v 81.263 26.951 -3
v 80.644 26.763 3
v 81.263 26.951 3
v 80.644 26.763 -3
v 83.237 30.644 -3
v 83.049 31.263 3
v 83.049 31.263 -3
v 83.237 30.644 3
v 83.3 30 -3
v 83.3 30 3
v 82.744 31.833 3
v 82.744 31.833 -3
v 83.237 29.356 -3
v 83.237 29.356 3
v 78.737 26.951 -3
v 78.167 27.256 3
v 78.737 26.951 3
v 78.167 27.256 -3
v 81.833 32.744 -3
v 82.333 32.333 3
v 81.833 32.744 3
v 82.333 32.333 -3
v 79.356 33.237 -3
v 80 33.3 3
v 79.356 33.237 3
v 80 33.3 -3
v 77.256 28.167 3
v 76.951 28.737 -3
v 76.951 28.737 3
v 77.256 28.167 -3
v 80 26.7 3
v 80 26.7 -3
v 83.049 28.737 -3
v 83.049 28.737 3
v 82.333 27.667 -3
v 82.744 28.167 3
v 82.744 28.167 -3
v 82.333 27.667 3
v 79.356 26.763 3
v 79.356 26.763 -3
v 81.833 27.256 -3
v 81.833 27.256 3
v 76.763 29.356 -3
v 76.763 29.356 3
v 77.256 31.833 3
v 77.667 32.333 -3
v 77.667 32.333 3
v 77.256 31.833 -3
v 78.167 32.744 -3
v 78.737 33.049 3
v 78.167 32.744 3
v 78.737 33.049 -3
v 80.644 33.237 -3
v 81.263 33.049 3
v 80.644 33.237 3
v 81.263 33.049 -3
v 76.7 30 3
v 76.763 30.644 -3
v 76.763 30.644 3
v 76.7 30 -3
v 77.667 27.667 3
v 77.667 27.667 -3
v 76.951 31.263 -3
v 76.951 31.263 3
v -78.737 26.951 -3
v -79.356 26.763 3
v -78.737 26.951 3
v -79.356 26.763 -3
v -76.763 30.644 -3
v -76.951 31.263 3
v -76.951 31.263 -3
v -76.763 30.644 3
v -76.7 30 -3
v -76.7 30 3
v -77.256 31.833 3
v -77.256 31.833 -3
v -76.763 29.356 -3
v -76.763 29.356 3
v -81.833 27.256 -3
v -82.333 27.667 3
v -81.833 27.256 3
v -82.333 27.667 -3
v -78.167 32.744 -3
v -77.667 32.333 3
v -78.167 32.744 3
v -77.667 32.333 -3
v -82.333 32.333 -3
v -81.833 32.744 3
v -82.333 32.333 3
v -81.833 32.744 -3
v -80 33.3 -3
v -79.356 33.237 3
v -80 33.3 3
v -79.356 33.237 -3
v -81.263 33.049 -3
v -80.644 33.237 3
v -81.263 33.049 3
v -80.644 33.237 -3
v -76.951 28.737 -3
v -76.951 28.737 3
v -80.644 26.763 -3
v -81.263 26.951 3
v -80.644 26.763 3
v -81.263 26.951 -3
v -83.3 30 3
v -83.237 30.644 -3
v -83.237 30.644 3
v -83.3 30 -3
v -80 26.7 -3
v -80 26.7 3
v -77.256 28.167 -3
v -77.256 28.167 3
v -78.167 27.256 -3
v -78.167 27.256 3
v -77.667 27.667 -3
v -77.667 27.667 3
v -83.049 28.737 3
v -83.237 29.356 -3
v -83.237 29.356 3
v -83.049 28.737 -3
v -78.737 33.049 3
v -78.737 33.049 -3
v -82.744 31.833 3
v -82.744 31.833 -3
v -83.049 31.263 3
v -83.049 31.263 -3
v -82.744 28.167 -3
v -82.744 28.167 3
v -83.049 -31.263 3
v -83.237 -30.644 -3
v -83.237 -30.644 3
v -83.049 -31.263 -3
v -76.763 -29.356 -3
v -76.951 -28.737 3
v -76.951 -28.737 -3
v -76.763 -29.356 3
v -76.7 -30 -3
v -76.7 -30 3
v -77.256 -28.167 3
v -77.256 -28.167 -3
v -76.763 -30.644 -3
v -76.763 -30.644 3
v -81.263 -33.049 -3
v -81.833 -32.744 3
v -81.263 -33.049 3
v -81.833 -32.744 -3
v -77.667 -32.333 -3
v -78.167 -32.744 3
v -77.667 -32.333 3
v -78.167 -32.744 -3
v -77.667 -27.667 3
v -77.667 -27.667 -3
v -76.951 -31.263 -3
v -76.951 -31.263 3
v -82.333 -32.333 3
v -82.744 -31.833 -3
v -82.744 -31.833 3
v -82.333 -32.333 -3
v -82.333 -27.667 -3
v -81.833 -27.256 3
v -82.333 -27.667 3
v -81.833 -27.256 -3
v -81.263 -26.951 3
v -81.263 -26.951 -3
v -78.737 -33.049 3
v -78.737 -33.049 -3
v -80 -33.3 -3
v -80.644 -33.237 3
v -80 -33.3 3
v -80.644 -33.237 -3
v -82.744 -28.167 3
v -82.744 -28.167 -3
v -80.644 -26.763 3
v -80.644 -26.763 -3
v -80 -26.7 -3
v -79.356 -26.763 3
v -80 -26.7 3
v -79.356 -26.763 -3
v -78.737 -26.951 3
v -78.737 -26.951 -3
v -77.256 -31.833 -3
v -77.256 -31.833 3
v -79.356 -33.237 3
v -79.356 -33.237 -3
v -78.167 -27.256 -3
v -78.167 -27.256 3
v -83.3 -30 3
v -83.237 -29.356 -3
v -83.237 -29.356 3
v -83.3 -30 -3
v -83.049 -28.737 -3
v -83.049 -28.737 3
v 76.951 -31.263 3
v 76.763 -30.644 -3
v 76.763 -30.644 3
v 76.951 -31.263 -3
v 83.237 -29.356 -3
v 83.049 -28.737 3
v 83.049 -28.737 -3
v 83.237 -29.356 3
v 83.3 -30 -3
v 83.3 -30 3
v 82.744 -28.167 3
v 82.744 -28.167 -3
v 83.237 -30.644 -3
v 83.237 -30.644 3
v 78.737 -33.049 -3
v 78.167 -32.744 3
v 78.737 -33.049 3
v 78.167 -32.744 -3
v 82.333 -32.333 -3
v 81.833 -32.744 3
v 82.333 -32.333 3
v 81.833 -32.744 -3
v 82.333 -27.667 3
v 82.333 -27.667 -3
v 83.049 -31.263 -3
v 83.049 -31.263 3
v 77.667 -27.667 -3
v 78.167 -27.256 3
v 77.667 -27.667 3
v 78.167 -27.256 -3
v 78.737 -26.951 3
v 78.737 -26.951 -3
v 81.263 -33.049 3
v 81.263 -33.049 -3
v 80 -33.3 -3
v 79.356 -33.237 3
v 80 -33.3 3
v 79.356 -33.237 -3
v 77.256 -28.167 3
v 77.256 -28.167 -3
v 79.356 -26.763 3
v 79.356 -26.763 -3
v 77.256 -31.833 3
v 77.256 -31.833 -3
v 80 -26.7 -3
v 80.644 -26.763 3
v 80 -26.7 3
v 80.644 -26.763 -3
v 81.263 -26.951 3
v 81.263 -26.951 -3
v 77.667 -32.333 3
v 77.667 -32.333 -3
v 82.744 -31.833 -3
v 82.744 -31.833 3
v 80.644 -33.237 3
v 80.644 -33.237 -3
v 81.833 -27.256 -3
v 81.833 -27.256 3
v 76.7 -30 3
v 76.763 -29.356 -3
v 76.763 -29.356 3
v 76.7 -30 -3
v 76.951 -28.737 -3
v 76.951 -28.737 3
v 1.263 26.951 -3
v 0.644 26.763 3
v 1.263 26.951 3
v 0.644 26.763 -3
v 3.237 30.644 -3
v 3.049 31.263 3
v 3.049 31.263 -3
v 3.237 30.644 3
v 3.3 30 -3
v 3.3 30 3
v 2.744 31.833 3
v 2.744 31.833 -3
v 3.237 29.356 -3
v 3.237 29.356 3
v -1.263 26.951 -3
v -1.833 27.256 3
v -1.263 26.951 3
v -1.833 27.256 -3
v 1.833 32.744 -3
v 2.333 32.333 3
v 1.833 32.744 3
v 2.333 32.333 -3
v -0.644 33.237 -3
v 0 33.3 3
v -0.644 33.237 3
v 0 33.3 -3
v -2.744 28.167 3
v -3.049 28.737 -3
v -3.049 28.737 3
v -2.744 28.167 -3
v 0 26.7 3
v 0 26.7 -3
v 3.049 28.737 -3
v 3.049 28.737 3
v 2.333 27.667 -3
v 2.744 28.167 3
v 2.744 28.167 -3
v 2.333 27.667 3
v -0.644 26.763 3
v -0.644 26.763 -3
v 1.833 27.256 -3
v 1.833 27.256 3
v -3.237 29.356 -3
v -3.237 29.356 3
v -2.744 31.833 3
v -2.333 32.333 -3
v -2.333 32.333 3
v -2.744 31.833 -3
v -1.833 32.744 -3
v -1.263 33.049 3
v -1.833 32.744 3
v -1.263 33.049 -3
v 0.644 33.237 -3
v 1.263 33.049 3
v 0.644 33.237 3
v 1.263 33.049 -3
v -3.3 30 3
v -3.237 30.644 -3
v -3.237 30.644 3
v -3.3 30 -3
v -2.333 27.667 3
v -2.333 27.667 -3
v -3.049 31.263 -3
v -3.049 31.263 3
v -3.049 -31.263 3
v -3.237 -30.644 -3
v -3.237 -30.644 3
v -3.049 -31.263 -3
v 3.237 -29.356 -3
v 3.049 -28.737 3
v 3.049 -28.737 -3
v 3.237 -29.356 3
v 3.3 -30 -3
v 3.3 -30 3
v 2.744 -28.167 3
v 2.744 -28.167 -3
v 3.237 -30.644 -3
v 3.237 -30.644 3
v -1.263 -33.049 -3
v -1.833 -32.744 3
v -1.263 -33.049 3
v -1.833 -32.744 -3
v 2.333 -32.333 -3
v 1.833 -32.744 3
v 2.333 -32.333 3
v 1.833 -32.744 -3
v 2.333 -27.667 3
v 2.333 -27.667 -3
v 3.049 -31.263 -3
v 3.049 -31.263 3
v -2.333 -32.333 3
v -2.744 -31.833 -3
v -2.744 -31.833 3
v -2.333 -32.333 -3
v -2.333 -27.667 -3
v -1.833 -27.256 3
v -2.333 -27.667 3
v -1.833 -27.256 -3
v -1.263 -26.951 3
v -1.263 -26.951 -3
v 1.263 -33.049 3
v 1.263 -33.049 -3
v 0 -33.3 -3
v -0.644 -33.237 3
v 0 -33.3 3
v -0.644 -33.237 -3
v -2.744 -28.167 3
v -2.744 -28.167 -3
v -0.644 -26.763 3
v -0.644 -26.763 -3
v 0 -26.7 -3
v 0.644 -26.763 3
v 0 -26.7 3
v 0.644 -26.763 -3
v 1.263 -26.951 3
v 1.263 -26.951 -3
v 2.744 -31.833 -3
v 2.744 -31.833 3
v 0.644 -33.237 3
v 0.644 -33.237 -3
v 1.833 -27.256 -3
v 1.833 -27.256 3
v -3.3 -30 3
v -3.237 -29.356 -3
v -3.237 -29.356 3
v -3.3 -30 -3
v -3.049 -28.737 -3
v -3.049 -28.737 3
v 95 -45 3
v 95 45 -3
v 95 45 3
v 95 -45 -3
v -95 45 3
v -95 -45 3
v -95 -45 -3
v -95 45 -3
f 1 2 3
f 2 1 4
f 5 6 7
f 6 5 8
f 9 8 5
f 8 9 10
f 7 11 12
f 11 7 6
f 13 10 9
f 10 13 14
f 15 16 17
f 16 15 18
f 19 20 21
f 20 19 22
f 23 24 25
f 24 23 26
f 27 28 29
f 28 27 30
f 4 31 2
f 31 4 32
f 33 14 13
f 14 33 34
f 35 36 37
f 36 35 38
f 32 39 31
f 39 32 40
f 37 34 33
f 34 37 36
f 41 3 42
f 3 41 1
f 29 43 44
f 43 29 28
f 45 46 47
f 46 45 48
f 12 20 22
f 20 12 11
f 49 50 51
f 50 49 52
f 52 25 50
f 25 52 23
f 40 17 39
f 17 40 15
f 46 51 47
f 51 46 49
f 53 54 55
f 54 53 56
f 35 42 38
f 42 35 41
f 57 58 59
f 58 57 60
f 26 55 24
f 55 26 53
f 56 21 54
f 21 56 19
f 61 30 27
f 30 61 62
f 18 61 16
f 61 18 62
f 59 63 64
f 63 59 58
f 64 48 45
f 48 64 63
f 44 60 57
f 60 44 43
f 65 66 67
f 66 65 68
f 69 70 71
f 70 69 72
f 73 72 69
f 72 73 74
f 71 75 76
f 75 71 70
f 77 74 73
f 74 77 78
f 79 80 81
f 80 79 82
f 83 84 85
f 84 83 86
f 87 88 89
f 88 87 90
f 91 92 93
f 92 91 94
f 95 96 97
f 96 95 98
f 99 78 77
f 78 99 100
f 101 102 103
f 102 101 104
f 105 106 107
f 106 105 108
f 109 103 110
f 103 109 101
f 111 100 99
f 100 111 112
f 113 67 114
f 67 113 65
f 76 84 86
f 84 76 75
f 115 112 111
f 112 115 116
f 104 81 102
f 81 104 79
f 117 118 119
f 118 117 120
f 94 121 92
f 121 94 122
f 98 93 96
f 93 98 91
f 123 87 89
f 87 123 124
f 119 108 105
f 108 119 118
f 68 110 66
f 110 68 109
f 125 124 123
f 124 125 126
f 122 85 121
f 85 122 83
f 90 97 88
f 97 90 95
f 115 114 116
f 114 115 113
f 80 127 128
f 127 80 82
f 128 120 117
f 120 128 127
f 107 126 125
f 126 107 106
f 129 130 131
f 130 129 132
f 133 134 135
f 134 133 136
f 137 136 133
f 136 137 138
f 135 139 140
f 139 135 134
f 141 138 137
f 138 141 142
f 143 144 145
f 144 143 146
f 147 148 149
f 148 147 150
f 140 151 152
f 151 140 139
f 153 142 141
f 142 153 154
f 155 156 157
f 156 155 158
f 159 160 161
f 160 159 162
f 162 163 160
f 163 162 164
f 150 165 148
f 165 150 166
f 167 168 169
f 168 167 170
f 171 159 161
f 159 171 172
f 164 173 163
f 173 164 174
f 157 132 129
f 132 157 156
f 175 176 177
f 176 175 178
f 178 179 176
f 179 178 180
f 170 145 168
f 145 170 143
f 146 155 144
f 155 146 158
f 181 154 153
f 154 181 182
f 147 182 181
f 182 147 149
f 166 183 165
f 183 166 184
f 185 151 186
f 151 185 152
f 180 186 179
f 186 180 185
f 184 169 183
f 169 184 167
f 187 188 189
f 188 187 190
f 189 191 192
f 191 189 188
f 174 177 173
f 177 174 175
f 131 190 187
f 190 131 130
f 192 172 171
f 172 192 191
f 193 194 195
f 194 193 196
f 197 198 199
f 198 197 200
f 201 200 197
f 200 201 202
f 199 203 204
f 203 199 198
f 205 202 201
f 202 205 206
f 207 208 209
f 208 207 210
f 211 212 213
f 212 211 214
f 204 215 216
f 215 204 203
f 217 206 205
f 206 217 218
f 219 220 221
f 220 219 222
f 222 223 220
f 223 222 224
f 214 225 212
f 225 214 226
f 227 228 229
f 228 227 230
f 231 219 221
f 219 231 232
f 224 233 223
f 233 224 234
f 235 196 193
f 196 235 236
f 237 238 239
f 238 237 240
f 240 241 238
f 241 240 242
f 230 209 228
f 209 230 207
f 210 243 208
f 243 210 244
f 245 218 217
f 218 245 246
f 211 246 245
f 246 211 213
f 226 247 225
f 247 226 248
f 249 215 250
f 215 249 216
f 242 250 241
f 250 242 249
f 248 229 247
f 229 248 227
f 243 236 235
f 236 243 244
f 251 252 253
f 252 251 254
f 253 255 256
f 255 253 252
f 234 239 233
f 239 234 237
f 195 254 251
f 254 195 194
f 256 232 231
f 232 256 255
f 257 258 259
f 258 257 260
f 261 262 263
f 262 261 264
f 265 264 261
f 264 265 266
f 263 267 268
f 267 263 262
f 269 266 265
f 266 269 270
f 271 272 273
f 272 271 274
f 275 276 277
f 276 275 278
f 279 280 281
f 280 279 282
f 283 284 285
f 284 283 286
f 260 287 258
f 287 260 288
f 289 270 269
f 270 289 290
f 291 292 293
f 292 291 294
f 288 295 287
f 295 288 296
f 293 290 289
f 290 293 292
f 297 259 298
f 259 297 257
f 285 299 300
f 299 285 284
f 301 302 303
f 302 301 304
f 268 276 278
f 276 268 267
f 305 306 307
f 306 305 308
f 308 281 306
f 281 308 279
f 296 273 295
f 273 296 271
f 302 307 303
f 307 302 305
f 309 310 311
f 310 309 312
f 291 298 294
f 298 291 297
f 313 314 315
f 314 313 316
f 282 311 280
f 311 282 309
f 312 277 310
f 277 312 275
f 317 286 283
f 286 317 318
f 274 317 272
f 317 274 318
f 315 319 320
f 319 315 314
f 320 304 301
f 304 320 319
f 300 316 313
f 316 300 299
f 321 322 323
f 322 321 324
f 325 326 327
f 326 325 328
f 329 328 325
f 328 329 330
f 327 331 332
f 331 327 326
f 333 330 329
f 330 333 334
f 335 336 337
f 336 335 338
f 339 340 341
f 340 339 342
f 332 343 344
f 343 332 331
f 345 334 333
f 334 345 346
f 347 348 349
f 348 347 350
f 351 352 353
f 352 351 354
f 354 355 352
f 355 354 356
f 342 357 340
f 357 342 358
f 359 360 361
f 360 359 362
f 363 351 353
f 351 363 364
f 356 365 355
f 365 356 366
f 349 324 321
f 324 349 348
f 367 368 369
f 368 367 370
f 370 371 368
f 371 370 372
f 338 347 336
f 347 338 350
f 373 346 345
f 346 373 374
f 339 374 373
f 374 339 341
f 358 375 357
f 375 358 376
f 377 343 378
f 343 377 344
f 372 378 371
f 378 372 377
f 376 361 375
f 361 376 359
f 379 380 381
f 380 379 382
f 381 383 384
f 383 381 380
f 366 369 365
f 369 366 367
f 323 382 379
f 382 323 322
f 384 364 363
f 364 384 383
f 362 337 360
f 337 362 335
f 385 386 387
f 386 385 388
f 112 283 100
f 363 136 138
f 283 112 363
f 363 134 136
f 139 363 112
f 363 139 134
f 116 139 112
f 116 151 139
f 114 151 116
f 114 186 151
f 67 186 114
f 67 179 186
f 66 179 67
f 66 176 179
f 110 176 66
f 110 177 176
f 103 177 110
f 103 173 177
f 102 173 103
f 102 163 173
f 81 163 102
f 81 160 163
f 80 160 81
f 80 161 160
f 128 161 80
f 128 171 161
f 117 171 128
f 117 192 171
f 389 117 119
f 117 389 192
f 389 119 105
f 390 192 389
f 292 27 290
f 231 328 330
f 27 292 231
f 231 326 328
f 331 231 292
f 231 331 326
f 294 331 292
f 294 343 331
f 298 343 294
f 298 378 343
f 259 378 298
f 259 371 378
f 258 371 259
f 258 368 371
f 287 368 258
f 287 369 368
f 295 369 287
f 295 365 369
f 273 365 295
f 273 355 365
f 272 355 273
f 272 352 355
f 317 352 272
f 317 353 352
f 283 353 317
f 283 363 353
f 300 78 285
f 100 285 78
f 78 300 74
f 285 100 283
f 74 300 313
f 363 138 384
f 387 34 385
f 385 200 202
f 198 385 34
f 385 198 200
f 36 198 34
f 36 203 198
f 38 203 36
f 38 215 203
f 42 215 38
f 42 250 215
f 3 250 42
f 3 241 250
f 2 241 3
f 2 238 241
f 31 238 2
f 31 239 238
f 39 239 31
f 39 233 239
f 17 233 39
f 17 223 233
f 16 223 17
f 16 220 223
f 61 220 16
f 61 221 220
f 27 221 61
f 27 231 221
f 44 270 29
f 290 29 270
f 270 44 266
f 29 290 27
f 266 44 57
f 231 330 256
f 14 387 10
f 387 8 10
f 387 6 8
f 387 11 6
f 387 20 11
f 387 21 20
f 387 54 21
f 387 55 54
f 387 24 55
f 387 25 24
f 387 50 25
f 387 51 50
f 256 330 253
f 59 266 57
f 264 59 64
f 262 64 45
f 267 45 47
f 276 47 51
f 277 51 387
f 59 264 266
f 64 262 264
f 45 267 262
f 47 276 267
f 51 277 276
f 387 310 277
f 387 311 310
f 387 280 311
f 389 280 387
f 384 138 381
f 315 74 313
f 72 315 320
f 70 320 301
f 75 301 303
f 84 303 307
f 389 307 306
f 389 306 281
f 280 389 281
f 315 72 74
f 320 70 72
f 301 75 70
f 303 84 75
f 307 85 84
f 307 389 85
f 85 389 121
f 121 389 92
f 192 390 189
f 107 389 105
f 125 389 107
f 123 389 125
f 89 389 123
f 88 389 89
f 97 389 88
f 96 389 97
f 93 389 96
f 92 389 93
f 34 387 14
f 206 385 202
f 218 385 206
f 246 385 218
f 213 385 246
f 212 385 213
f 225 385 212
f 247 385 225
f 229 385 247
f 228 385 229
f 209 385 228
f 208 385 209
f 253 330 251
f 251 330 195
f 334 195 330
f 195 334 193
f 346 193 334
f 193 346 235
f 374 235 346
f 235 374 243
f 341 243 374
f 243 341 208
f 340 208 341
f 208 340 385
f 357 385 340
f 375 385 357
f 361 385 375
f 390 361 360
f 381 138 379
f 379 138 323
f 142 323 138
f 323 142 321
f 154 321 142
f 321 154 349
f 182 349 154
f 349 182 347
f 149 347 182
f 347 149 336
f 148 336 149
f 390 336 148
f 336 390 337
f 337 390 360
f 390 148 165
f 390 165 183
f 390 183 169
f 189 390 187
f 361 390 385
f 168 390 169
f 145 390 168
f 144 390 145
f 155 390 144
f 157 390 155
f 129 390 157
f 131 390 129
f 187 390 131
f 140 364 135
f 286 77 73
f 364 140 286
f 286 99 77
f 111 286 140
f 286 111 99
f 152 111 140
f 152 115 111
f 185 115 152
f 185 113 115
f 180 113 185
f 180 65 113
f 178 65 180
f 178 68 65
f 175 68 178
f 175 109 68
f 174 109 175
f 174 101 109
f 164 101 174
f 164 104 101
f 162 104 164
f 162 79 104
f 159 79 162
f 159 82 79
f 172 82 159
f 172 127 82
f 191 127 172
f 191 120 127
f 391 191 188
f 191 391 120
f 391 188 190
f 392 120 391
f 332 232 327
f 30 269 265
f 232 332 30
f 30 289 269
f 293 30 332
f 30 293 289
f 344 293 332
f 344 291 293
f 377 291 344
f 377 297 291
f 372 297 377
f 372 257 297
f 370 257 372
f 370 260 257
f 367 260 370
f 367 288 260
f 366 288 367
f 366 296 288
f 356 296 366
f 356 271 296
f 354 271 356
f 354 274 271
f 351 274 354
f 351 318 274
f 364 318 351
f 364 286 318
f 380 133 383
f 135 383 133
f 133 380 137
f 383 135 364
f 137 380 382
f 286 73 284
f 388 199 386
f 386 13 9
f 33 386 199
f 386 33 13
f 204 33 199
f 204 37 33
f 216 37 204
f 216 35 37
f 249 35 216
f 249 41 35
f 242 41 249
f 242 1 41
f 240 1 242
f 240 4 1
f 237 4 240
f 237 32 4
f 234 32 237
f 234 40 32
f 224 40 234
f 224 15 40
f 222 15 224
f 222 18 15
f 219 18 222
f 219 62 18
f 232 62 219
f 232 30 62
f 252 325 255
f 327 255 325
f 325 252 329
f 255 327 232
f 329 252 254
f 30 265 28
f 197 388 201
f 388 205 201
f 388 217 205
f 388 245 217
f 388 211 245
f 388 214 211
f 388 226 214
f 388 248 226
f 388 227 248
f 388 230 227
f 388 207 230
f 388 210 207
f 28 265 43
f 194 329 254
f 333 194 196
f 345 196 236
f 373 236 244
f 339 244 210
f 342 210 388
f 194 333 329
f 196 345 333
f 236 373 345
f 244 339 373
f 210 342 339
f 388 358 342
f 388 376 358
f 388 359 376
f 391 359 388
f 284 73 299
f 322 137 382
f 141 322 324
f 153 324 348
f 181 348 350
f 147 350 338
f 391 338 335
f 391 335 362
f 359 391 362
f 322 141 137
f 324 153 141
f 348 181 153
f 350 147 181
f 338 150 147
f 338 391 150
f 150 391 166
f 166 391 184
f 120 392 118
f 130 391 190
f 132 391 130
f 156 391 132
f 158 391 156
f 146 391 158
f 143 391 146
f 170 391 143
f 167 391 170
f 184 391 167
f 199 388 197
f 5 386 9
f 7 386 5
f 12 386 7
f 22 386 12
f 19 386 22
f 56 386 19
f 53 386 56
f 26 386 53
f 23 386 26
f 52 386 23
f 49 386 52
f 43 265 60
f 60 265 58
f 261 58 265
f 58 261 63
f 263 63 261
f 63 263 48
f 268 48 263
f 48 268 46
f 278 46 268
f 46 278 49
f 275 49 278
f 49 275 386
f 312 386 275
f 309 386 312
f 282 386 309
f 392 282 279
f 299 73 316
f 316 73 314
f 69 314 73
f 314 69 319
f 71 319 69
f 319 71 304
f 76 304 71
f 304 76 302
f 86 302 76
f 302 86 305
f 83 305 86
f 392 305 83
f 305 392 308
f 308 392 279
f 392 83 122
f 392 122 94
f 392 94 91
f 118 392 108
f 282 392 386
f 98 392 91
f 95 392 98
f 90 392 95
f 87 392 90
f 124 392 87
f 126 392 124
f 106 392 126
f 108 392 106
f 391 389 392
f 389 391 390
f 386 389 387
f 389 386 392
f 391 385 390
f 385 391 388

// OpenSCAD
$fn = 32;

// ----------------------------------------------------------------------
// Corner plate 190 x 90 x 6
// 6 holes, centres taken from the edge offset
// ----------------------------------------------------------------------

// --- parameters (mm) ---
plate = [190, 90, 6];  // overall size (x, y, z)
holes = 6;             // number of holes the drawing asks for
hole_d = 6.6;          // hole diameter
edge = 15;             // hole centre offset from the plate edge

// --- derived feature positions (mm) ---
corner_x = plate[0] / 2 - edge;  // = 80   corner hole X
corner_y = plate[1] / 2 - edge;  // = 30   corner hole Y
feature_centers = [
  [corner_x, corner_y],
  [-corner_x, corner_y],
  [-corner_x, -corner_y],
  [corner_x, -corner_y],
  [0, corner_y],
  [0, -corner_y]
];   // hole centres the loop below drills

// plate outline, every hole drilled through with the same cutters
difference() {
  cube(plate, center = true);
  for (centre = feature_centers)
    translate([centre[0], centre[1], 0])
      cylinder(d = hole_d, h = plate[2] + 2, center = true);
}
